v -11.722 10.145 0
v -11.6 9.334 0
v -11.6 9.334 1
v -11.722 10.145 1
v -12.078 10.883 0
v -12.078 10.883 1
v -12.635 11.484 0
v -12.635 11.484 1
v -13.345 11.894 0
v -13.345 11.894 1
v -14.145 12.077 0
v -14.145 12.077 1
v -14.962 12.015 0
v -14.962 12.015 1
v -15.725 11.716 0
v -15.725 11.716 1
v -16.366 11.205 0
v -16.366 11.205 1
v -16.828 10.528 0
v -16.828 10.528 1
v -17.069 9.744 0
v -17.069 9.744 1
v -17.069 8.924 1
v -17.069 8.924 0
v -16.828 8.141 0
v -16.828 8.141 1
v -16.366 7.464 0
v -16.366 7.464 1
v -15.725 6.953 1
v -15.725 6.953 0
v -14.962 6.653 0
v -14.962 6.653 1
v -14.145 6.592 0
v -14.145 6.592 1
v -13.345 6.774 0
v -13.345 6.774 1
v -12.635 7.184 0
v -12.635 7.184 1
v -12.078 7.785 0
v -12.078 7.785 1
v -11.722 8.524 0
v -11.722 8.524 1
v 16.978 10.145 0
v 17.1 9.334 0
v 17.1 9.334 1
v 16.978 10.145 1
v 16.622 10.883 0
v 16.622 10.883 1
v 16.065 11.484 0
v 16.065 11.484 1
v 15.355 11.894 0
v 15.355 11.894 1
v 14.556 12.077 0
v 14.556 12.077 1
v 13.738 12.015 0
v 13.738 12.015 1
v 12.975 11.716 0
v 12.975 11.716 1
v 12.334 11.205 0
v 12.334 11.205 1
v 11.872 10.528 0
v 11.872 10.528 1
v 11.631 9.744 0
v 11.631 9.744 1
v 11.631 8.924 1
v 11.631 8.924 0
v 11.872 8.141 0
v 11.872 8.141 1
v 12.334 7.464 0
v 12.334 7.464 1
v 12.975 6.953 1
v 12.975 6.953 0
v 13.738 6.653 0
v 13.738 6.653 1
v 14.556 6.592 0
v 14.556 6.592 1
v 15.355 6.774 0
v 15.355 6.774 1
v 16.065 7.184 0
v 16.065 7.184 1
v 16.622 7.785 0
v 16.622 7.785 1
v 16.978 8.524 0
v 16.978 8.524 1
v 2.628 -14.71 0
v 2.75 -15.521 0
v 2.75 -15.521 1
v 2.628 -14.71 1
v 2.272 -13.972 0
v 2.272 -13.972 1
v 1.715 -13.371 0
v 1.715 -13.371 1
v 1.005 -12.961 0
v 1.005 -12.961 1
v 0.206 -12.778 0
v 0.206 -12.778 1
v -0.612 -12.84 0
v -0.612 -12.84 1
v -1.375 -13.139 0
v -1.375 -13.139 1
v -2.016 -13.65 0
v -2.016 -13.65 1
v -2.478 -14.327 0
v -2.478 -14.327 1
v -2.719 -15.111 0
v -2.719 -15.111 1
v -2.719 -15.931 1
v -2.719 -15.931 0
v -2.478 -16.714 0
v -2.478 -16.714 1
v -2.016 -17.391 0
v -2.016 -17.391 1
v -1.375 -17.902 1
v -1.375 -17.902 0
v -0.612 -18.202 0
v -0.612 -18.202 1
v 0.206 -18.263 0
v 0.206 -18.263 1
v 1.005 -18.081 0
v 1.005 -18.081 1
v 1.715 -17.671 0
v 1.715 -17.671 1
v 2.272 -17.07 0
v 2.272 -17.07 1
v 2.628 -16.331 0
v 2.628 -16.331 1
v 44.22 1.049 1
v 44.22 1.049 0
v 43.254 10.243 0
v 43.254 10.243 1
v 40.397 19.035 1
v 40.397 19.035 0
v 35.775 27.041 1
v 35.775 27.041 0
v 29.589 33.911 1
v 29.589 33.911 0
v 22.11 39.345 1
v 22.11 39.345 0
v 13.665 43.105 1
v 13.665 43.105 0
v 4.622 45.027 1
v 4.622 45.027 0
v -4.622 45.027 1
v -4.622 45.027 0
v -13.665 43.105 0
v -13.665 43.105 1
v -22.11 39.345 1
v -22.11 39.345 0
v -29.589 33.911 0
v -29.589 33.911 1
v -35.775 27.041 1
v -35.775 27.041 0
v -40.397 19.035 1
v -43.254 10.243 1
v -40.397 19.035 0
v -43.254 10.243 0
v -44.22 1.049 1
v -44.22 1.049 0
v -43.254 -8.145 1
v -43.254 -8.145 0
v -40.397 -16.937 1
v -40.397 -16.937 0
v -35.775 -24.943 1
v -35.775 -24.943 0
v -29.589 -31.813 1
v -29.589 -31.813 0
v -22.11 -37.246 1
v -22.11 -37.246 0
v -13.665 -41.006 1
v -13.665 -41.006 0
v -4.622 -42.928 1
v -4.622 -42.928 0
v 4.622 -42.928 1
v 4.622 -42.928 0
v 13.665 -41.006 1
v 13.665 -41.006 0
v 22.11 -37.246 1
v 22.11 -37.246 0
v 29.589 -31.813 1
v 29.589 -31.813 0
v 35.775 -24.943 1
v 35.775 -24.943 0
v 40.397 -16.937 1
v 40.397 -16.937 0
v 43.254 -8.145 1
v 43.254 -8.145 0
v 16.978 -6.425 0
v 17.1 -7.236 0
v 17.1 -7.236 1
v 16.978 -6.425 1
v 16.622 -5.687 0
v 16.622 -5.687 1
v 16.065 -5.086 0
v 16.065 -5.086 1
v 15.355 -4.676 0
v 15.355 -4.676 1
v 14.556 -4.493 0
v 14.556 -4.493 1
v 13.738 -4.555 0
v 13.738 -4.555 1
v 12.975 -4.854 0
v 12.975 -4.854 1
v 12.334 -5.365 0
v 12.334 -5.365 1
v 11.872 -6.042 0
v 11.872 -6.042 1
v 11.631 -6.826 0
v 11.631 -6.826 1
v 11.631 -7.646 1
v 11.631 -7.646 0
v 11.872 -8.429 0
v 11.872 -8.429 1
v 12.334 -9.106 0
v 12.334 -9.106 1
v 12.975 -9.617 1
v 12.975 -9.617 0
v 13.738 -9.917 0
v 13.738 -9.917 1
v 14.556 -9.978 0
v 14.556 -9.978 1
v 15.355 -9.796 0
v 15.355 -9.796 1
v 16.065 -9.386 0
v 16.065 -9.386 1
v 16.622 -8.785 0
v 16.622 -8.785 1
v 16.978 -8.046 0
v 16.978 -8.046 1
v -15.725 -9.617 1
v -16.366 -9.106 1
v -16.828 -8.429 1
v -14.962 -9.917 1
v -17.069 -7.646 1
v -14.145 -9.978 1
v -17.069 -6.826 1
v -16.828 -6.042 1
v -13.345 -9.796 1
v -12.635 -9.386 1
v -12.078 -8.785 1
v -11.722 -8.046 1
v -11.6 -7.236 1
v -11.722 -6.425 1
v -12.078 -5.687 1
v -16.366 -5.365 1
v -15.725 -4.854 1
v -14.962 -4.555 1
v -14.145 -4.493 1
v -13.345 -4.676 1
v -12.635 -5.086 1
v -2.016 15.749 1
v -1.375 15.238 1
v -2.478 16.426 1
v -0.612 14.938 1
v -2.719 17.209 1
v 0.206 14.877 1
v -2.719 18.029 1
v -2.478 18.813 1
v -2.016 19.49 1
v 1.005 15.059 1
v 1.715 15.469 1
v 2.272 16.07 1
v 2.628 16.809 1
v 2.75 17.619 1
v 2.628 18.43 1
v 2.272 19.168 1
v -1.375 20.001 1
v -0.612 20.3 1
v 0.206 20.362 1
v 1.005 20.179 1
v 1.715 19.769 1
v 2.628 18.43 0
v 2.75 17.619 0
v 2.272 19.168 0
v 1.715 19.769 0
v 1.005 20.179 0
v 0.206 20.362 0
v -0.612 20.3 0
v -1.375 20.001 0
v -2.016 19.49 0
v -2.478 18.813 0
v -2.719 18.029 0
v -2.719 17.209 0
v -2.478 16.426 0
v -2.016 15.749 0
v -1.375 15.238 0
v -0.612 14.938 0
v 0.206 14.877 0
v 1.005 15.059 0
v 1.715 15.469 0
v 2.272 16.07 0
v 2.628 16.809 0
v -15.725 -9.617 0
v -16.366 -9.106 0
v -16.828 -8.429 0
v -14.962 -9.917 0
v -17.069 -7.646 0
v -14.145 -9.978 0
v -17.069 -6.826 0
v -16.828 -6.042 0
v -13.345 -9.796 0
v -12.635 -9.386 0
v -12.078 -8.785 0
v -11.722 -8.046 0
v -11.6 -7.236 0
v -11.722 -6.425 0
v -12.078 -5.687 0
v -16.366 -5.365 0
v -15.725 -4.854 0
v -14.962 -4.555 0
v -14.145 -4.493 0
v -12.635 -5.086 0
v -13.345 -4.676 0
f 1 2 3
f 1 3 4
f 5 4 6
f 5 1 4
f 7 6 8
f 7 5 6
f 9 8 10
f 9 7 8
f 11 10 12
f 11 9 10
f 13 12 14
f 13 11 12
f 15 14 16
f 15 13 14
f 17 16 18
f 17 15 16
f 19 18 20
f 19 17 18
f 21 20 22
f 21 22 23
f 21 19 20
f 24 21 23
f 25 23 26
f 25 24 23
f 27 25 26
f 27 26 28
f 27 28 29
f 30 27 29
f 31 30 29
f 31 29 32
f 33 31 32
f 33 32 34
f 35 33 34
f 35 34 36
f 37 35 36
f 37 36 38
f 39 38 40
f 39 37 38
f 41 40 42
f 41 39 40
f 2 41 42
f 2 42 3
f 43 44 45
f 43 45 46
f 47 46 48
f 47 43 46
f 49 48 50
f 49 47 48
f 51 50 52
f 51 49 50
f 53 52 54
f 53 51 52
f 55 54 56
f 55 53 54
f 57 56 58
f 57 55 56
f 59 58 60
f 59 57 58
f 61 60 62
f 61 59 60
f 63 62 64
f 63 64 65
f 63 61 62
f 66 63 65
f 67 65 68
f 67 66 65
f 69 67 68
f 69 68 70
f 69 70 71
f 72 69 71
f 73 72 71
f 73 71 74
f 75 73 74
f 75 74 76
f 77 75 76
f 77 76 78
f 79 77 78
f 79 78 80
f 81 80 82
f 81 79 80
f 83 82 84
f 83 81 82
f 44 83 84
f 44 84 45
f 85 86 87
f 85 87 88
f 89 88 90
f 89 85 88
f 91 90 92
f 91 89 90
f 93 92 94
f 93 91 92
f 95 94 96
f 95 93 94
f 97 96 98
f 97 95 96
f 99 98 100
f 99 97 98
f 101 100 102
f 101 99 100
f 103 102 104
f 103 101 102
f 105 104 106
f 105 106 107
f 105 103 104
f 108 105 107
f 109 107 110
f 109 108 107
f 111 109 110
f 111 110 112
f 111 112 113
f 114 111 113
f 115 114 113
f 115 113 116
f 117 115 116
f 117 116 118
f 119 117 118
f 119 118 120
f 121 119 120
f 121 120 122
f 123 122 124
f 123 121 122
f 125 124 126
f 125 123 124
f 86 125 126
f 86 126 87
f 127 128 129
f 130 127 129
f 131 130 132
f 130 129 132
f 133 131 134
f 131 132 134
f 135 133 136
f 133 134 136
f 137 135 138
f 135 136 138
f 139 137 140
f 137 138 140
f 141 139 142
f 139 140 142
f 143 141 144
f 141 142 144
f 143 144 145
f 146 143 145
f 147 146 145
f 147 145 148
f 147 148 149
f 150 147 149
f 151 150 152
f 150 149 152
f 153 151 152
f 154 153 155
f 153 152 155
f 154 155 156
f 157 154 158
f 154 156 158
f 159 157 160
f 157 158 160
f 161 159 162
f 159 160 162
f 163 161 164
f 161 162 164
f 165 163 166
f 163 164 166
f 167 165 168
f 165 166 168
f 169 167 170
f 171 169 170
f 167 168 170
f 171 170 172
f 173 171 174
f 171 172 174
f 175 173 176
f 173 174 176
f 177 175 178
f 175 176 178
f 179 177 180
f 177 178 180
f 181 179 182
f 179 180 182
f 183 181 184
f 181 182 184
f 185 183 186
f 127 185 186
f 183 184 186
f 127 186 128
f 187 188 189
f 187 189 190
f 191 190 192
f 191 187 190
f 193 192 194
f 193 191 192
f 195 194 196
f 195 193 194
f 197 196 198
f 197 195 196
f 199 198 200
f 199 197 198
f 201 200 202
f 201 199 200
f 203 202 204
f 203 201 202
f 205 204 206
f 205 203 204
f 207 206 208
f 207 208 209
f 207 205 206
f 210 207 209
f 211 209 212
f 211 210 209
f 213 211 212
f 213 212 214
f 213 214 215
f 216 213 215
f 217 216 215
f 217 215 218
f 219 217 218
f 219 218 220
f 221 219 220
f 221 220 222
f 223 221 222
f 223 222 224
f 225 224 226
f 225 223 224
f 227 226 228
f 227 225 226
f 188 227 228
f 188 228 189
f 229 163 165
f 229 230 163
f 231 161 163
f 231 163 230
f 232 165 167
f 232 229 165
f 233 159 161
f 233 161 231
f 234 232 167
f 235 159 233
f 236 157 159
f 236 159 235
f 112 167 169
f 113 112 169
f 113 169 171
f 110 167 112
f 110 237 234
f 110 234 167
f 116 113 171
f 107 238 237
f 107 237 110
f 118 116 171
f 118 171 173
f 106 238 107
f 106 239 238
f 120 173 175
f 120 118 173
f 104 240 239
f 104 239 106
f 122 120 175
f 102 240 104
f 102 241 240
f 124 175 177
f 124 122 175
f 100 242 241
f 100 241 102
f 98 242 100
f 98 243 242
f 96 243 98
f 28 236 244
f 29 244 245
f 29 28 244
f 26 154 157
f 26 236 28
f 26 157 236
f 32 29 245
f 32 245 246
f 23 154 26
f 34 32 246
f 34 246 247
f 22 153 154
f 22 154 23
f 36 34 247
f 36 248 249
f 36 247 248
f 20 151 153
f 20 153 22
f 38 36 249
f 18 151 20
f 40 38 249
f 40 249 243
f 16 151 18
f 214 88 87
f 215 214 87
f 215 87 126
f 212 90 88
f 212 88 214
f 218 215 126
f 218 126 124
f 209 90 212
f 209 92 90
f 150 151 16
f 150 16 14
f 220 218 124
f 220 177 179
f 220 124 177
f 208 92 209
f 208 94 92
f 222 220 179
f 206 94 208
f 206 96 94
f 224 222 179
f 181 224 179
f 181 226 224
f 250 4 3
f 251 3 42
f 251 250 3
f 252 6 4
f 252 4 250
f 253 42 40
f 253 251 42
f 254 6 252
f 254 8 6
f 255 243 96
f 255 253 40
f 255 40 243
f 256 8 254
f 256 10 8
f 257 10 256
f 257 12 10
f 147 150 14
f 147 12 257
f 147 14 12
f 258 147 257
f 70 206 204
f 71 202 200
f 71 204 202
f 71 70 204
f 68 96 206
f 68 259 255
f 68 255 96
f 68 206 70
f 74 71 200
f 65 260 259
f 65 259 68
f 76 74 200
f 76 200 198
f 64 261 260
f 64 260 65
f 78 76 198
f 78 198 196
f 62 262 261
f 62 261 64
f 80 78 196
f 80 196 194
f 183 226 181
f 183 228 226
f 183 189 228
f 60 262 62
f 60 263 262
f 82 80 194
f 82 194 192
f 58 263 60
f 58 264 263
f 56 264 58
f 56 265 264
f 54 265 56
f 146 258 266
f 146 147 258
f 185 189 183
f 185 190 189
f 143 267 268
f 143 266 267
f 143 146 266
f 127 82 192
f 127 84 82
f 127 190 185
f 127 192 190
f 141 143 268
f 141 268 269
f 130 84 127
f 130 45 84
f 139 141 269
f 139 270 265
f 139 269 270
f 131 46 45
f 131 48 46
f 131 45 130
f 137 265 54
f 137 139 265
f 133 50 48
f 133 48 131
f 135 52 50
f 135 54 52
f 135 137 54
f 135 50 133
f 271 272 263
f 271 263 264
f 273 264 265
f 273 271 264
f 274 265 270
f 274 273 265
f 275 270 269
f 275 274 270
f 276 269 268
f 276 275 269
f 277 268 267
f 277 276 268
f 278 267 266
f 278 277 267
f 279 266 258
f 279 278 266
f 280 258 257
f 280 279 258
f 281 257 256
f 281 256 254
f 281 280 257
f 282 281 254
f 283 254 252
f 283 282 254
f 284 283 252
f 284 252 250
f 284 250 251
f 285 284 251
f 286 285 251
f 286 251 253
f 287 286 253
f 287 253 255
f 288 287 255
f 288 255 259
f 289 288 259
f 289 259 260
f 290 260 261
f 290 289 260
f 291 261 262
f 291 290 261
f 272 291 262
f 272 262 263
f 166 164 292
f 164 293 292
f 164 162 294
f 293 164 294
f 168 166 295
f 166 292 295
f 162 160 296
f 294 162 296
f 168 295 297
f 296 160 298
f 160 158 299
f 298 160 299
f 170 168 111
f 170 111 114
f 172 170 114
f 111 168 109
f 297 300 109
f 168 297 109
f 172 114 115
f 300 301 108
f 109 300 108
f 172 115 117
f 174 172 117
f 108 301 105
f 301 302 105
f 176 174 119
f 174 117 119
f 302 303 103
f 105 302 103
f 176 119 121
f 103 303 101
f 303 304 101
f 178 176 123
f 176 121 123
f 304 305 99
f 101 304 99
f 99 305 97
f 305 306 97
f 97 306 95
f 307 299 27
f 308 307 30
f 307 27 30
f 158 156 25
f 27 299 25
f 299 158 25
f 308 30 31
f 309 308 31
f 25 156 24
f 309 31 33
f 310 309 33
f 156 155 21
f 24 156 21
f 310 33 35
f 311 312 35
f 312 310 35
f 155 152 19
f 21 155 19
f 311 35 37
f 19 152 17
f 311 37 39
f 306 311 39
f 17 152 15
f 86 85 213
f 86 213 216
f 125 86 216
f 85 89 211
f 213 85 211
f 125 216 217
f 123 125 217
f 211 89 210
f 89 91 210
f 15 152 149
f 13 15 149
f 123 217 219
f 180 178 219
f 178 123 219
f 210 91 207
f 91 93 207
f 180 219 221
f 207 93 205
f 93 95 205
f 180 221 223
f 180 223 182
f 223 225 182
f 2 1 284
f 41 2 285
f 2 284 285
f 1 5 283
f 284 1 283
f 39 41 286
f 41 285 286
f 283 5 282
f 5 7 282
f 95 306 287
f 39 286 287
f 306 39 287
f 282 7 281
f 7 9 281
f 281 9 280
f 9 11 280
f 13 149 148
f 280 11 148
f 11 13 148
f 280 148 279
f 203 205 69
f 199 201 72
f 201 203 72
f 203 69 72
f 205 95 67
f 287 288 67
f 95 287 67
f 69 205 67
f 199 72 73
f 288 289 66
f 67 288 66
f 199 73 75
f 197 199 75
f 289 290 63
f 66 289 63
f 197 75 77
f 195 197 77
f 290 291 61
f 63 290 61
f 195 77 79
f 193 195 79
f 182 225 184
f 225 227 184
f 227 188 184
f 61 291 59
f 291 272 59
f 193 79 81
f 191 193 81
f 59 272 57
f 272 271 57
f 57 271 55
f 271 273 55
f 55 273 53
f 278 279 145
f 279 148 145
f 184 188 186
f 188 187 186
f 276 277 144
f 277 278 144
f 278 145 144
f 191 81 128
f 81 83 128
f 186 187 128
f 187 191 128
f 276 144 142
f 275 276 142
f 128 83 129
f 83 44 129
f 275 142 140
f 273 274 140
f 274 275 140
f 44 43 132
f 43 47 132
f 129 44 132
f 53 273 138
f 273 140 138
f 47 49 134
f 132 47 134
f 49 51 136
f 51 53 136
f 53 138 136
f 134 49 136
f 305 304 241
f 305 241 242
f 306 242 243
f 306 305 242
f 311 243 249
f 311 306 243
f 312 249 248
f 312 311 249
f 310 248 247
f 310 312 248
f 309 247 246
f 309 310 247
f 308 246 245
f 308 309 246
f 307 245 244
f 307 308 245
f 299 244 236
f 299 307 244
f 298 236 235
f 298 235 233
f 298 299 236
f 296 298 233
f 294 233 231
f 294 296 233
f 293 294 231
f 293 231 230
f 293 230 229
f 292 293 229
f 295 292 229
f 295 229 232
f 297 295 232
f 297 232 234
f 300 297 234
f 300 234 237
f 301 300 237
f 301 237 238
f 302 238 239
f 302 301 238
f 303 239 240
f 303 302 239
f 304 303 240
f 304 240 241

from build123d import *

# Parameters (mm, degrees)
SKETCH1_R           = 44.22
SKETCH1_R_2         = 2.75
BOSS_EXTRUDE1_DEPTH = 1


with BuildPart() as part:
    # Sketch1 → Boss-Extrude1 (new body)
    with BuildSketch(Plane.XY):
        with Locations((0, 1.049337112)):
            Circle(SKETCH1_R)
        with Locations((0, 17.619337112)):
            Circle(SKETCH1_R_2, mode=Mode.SUBTRACT)
        with Locations((14.350040941, 9.334337112)):
            Circle(SKETCH1_R_2, mode=Mode.SUBTRACT)
        with Locations((14.350040941, -7.235662888)):
            Circle(SKETCH1_R_2, mode=Mode.SUBTRACT)
        with Locations((0, -15.520662888)):
            Circle(SKETCH1_R_2, mode=Mode.SUBTRACT)
        with Locations((-14.350040941, -7.235662888)):
            Circle(SKETCH1_R_2, mode=Mode.SUBTRACT)
        with Locations((-14.350040941, 9.334337112)):
            Circle(SKETCH1_R_2, mode=Mode.SUBTRACT)
    extrude(amount=BOSS_EXTRUDE1_DEPTH)


solid = part.part
